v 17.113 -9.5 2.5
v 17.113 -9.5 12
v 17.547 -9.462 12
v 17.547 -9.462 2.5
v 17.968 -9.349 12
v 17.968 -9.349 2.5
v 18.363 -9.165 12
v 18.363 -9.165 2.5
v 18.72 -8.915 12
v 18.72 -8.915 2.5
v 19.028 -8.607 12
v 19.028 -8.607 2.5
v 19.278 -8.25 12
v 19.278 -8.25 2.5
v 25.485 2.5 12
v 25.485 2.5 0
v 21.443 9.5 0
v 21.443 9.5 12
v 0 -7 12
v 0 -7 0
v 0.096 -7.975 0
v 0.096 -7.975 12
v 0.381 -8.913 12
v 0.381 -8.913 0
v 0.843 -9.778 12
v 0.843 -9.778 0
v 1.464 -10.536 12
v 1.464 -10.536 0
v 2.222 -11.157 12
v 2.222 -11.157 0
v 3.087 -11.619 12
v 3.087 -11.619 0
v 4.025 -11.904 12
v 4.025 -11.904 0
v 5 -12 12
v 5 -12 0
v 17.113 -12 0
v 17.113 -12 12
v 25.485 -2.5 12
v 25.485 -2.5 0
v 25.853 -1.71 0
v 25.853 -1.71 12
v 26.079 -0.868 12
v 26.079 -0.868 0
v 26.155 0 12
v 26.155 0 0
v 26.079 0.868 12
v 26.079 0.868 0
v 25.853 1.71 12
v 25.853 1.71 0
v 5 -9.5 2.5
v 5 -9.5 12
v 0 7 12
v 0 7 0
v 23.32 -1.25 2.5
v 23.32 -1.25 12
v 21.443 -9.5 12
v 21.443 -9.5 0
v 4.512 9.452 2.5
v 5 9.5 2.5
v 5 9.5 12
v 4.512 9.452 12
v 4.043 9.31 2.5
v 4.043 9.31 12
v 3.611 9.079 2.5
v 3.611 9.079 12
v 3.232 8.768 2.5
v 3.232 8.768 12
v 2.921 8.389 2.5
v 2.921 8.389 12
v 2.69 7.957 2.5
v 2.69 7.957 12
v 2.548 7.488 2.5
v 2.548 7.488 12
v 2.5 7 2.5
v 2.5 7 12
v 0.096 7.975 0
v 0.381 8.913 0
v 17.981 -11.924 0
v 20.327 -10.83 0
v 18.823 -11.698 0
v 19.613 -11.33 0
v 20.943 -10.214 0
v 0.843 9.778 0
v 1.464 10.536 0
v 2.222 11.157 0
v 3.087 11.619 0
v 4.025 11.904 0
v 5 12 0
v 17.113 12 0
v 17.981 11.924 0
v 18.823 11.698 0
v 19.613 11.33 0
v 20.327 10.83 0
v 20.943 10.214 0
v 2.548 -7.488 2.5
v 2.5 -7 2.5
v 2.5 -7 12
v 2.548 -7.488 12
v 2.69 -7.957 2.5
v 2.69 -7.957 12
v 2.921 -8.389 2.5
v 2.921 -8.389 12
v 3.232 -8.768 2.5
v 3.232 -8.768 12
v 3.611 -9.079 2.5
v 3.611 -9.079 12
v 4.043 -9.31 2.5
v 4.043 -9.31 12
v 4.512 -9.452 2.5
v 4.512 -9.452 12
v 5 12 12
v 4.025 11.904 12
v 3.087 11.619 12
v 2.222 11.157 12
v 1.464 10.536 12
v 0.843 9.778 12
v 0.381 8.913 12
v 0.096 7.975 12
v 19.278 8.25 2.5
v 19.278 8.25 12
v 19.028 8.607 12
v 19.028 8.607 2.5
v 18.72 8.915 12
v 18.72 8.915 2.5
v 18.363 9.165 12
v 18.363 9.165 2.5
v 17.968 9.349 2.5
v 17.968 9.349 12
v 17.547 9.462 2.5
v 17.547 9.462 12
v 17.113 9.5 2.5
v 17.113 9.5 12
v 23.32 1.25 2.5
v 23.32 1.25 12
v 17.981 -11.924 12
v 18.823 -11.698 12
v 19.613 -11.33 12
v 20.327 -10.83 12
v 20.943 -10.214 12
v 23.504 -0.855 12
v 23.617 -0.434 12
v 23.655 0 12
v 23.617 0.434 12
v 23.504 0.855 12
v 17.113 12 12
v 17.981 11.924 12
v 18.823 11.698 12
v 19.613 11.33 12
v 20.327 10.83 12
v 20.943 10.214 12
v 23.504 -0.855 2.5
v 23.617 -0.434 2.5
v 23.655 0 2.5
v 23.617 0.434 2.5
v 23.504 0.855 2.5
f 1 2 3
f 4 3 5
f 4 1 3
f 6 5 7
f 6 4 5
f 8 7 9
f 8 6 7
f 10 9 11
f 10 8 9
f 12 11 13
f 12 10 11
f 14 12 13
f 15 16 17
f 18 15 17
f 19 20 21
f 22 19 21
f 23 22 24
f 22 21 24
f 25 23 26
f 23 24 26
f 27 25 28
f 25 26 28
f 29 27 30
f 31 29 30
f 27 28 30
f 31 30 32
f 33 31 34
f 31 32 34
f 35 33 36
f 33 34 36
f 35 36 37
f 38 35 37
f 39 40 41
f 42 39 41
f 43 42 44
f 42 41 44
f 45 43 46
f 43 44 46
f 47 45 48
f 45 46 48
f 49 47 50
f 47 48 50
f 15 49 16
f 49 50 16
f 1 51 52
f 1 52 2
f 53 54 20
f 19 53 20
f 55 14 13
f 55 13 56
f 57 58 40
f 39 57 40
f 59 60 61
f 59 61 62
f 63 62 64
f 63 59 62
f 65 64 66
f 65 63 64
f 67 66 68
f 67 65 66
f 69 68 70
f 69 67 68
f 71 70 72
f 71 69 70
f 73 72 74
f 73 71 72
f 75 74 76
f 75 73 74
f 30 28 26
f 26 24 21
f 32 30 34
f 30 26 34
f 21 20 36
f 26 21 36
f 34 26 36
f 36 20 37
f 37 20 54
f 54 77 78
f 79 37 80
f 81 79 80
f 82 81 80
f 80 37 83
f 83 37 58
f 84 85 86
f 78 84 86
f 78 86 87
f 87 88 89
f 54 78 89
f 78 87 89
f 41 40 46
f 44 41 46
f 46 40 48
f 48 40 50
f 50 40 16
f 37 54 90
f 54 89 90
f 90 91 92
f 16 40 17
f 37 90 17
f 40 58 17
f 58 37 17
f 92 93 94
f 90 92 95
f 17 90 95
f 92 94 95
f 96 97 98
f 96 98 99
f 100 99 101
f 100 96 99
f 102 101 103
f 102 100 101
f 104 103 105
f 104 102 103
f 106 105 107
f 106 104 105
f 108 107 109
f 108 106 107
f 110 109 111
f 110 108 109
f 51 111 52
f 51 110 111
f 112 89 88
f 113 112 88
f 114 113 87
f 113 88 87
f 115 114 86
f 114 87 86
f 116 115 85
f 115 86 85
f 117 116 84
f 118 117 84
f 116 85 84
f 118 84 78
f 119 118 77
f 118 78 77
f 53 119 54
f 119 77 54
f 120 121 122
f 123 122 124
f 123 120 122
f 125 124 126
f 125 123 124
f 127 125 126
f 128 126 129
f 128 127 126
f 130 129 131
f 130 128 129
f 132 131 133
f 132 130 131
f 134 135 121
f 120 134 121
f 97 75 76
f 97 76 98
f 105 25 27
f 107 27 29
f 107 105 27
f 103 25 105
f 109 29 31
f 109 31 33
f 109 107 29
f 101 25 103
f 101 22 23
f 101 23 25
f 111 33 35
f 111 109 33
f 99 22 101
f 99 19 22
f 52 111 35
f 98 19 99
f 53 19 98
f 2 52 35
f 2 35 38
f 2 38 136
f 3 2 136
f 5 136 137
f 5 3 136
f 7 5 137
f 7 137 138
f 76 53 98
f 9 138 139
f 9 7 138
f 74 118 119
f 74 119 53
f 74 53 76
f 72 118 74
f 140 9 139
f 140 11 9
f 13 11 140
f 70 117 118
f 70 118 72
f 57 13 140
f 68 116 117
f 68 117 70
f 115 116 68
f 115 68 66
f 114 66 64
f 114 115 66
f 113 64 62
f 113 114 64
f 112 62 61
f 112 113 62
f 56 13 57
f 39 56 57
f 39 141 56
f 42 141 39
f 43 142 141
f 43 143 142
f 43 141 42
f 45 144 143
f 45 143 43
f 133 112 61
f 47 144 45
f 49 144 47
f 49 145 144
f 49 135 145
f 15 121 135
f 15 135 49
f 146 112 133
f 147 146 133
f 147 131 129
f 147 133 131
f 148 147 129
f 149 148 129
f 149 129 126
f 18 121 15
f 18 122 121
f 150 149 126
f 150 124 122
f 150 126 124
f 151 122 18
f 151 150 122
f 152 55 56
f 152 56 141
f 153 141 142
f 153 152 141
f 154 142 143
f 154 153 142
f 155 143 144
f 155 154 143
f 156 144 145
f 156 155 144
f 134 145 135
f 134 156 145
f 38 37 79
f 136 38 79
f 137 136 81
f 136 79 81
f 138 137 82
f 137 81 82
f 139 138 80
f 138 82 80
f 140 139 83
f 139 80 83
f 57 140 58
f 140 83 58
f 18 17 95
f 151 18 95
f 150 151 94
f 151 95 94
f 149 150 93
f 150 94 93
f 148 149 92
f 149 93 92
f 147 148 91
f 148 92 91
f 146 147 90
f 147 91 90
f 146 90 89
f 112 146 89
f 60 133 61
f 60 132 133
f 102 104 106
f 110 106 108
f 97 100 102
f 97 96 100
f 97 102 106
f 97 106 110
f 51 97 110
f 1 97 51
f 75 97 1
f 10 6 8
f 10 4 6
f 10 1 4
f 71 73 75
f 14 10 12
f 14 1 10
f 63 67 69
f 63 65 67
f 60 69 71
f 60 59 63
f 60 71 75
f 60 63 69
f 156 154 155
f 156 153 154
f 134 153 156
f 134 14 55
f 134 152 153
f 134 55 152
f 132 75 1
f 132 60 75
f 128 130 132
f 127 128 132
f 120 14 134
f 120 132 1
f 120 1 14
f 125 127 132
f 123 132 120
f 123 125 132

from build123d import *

# Parameters (mm, degrees)
F1_DEPTH = 12
F2_T     = -2.5


with BuildPart() as f1:
    # F0 (on Top) → F1 (new body)
    with BuildSketch(Plane.XY):
        with BuildLine():
            ThreePointArc((5, 12), (1.464466, 10.535534), (0, 7))
            Line((0, 7), (0, 0))
            Line((0, 0), (0, -7))
            ThreePointArc((0, -7), (1.464466, -10.535534), (5, -12))
            Line((5, -12), (17.113249, -12))
            ThreePointArc((17.113249, -12), (19.613249, -11.330127), (21.443376, -9.5))
            Line((21.443376, -9.5), (25.484828, -2.5))
            ThreePointArc((25.484828, -2.5), (26.154701, 0), (25.484828, 2.5))
            Line((25.484828, 2.5), (21.443376, 9.5))
            ThreePointArc((21.443376, 9.5), (19.613249, 11.330127), (17.113249, 12))
            Line((17.113249, 12), (5, 12))
        make_face()
    extrude(amount=F1_DEPTH)

    # F2
    f2_openings = [f1.faces().sort_by_distance(p)[0] for p in [
        (11.952499, 0, 12),
    ]]
    offset(amount=F2_T, openings=f2_openings)


solid = f1.part
